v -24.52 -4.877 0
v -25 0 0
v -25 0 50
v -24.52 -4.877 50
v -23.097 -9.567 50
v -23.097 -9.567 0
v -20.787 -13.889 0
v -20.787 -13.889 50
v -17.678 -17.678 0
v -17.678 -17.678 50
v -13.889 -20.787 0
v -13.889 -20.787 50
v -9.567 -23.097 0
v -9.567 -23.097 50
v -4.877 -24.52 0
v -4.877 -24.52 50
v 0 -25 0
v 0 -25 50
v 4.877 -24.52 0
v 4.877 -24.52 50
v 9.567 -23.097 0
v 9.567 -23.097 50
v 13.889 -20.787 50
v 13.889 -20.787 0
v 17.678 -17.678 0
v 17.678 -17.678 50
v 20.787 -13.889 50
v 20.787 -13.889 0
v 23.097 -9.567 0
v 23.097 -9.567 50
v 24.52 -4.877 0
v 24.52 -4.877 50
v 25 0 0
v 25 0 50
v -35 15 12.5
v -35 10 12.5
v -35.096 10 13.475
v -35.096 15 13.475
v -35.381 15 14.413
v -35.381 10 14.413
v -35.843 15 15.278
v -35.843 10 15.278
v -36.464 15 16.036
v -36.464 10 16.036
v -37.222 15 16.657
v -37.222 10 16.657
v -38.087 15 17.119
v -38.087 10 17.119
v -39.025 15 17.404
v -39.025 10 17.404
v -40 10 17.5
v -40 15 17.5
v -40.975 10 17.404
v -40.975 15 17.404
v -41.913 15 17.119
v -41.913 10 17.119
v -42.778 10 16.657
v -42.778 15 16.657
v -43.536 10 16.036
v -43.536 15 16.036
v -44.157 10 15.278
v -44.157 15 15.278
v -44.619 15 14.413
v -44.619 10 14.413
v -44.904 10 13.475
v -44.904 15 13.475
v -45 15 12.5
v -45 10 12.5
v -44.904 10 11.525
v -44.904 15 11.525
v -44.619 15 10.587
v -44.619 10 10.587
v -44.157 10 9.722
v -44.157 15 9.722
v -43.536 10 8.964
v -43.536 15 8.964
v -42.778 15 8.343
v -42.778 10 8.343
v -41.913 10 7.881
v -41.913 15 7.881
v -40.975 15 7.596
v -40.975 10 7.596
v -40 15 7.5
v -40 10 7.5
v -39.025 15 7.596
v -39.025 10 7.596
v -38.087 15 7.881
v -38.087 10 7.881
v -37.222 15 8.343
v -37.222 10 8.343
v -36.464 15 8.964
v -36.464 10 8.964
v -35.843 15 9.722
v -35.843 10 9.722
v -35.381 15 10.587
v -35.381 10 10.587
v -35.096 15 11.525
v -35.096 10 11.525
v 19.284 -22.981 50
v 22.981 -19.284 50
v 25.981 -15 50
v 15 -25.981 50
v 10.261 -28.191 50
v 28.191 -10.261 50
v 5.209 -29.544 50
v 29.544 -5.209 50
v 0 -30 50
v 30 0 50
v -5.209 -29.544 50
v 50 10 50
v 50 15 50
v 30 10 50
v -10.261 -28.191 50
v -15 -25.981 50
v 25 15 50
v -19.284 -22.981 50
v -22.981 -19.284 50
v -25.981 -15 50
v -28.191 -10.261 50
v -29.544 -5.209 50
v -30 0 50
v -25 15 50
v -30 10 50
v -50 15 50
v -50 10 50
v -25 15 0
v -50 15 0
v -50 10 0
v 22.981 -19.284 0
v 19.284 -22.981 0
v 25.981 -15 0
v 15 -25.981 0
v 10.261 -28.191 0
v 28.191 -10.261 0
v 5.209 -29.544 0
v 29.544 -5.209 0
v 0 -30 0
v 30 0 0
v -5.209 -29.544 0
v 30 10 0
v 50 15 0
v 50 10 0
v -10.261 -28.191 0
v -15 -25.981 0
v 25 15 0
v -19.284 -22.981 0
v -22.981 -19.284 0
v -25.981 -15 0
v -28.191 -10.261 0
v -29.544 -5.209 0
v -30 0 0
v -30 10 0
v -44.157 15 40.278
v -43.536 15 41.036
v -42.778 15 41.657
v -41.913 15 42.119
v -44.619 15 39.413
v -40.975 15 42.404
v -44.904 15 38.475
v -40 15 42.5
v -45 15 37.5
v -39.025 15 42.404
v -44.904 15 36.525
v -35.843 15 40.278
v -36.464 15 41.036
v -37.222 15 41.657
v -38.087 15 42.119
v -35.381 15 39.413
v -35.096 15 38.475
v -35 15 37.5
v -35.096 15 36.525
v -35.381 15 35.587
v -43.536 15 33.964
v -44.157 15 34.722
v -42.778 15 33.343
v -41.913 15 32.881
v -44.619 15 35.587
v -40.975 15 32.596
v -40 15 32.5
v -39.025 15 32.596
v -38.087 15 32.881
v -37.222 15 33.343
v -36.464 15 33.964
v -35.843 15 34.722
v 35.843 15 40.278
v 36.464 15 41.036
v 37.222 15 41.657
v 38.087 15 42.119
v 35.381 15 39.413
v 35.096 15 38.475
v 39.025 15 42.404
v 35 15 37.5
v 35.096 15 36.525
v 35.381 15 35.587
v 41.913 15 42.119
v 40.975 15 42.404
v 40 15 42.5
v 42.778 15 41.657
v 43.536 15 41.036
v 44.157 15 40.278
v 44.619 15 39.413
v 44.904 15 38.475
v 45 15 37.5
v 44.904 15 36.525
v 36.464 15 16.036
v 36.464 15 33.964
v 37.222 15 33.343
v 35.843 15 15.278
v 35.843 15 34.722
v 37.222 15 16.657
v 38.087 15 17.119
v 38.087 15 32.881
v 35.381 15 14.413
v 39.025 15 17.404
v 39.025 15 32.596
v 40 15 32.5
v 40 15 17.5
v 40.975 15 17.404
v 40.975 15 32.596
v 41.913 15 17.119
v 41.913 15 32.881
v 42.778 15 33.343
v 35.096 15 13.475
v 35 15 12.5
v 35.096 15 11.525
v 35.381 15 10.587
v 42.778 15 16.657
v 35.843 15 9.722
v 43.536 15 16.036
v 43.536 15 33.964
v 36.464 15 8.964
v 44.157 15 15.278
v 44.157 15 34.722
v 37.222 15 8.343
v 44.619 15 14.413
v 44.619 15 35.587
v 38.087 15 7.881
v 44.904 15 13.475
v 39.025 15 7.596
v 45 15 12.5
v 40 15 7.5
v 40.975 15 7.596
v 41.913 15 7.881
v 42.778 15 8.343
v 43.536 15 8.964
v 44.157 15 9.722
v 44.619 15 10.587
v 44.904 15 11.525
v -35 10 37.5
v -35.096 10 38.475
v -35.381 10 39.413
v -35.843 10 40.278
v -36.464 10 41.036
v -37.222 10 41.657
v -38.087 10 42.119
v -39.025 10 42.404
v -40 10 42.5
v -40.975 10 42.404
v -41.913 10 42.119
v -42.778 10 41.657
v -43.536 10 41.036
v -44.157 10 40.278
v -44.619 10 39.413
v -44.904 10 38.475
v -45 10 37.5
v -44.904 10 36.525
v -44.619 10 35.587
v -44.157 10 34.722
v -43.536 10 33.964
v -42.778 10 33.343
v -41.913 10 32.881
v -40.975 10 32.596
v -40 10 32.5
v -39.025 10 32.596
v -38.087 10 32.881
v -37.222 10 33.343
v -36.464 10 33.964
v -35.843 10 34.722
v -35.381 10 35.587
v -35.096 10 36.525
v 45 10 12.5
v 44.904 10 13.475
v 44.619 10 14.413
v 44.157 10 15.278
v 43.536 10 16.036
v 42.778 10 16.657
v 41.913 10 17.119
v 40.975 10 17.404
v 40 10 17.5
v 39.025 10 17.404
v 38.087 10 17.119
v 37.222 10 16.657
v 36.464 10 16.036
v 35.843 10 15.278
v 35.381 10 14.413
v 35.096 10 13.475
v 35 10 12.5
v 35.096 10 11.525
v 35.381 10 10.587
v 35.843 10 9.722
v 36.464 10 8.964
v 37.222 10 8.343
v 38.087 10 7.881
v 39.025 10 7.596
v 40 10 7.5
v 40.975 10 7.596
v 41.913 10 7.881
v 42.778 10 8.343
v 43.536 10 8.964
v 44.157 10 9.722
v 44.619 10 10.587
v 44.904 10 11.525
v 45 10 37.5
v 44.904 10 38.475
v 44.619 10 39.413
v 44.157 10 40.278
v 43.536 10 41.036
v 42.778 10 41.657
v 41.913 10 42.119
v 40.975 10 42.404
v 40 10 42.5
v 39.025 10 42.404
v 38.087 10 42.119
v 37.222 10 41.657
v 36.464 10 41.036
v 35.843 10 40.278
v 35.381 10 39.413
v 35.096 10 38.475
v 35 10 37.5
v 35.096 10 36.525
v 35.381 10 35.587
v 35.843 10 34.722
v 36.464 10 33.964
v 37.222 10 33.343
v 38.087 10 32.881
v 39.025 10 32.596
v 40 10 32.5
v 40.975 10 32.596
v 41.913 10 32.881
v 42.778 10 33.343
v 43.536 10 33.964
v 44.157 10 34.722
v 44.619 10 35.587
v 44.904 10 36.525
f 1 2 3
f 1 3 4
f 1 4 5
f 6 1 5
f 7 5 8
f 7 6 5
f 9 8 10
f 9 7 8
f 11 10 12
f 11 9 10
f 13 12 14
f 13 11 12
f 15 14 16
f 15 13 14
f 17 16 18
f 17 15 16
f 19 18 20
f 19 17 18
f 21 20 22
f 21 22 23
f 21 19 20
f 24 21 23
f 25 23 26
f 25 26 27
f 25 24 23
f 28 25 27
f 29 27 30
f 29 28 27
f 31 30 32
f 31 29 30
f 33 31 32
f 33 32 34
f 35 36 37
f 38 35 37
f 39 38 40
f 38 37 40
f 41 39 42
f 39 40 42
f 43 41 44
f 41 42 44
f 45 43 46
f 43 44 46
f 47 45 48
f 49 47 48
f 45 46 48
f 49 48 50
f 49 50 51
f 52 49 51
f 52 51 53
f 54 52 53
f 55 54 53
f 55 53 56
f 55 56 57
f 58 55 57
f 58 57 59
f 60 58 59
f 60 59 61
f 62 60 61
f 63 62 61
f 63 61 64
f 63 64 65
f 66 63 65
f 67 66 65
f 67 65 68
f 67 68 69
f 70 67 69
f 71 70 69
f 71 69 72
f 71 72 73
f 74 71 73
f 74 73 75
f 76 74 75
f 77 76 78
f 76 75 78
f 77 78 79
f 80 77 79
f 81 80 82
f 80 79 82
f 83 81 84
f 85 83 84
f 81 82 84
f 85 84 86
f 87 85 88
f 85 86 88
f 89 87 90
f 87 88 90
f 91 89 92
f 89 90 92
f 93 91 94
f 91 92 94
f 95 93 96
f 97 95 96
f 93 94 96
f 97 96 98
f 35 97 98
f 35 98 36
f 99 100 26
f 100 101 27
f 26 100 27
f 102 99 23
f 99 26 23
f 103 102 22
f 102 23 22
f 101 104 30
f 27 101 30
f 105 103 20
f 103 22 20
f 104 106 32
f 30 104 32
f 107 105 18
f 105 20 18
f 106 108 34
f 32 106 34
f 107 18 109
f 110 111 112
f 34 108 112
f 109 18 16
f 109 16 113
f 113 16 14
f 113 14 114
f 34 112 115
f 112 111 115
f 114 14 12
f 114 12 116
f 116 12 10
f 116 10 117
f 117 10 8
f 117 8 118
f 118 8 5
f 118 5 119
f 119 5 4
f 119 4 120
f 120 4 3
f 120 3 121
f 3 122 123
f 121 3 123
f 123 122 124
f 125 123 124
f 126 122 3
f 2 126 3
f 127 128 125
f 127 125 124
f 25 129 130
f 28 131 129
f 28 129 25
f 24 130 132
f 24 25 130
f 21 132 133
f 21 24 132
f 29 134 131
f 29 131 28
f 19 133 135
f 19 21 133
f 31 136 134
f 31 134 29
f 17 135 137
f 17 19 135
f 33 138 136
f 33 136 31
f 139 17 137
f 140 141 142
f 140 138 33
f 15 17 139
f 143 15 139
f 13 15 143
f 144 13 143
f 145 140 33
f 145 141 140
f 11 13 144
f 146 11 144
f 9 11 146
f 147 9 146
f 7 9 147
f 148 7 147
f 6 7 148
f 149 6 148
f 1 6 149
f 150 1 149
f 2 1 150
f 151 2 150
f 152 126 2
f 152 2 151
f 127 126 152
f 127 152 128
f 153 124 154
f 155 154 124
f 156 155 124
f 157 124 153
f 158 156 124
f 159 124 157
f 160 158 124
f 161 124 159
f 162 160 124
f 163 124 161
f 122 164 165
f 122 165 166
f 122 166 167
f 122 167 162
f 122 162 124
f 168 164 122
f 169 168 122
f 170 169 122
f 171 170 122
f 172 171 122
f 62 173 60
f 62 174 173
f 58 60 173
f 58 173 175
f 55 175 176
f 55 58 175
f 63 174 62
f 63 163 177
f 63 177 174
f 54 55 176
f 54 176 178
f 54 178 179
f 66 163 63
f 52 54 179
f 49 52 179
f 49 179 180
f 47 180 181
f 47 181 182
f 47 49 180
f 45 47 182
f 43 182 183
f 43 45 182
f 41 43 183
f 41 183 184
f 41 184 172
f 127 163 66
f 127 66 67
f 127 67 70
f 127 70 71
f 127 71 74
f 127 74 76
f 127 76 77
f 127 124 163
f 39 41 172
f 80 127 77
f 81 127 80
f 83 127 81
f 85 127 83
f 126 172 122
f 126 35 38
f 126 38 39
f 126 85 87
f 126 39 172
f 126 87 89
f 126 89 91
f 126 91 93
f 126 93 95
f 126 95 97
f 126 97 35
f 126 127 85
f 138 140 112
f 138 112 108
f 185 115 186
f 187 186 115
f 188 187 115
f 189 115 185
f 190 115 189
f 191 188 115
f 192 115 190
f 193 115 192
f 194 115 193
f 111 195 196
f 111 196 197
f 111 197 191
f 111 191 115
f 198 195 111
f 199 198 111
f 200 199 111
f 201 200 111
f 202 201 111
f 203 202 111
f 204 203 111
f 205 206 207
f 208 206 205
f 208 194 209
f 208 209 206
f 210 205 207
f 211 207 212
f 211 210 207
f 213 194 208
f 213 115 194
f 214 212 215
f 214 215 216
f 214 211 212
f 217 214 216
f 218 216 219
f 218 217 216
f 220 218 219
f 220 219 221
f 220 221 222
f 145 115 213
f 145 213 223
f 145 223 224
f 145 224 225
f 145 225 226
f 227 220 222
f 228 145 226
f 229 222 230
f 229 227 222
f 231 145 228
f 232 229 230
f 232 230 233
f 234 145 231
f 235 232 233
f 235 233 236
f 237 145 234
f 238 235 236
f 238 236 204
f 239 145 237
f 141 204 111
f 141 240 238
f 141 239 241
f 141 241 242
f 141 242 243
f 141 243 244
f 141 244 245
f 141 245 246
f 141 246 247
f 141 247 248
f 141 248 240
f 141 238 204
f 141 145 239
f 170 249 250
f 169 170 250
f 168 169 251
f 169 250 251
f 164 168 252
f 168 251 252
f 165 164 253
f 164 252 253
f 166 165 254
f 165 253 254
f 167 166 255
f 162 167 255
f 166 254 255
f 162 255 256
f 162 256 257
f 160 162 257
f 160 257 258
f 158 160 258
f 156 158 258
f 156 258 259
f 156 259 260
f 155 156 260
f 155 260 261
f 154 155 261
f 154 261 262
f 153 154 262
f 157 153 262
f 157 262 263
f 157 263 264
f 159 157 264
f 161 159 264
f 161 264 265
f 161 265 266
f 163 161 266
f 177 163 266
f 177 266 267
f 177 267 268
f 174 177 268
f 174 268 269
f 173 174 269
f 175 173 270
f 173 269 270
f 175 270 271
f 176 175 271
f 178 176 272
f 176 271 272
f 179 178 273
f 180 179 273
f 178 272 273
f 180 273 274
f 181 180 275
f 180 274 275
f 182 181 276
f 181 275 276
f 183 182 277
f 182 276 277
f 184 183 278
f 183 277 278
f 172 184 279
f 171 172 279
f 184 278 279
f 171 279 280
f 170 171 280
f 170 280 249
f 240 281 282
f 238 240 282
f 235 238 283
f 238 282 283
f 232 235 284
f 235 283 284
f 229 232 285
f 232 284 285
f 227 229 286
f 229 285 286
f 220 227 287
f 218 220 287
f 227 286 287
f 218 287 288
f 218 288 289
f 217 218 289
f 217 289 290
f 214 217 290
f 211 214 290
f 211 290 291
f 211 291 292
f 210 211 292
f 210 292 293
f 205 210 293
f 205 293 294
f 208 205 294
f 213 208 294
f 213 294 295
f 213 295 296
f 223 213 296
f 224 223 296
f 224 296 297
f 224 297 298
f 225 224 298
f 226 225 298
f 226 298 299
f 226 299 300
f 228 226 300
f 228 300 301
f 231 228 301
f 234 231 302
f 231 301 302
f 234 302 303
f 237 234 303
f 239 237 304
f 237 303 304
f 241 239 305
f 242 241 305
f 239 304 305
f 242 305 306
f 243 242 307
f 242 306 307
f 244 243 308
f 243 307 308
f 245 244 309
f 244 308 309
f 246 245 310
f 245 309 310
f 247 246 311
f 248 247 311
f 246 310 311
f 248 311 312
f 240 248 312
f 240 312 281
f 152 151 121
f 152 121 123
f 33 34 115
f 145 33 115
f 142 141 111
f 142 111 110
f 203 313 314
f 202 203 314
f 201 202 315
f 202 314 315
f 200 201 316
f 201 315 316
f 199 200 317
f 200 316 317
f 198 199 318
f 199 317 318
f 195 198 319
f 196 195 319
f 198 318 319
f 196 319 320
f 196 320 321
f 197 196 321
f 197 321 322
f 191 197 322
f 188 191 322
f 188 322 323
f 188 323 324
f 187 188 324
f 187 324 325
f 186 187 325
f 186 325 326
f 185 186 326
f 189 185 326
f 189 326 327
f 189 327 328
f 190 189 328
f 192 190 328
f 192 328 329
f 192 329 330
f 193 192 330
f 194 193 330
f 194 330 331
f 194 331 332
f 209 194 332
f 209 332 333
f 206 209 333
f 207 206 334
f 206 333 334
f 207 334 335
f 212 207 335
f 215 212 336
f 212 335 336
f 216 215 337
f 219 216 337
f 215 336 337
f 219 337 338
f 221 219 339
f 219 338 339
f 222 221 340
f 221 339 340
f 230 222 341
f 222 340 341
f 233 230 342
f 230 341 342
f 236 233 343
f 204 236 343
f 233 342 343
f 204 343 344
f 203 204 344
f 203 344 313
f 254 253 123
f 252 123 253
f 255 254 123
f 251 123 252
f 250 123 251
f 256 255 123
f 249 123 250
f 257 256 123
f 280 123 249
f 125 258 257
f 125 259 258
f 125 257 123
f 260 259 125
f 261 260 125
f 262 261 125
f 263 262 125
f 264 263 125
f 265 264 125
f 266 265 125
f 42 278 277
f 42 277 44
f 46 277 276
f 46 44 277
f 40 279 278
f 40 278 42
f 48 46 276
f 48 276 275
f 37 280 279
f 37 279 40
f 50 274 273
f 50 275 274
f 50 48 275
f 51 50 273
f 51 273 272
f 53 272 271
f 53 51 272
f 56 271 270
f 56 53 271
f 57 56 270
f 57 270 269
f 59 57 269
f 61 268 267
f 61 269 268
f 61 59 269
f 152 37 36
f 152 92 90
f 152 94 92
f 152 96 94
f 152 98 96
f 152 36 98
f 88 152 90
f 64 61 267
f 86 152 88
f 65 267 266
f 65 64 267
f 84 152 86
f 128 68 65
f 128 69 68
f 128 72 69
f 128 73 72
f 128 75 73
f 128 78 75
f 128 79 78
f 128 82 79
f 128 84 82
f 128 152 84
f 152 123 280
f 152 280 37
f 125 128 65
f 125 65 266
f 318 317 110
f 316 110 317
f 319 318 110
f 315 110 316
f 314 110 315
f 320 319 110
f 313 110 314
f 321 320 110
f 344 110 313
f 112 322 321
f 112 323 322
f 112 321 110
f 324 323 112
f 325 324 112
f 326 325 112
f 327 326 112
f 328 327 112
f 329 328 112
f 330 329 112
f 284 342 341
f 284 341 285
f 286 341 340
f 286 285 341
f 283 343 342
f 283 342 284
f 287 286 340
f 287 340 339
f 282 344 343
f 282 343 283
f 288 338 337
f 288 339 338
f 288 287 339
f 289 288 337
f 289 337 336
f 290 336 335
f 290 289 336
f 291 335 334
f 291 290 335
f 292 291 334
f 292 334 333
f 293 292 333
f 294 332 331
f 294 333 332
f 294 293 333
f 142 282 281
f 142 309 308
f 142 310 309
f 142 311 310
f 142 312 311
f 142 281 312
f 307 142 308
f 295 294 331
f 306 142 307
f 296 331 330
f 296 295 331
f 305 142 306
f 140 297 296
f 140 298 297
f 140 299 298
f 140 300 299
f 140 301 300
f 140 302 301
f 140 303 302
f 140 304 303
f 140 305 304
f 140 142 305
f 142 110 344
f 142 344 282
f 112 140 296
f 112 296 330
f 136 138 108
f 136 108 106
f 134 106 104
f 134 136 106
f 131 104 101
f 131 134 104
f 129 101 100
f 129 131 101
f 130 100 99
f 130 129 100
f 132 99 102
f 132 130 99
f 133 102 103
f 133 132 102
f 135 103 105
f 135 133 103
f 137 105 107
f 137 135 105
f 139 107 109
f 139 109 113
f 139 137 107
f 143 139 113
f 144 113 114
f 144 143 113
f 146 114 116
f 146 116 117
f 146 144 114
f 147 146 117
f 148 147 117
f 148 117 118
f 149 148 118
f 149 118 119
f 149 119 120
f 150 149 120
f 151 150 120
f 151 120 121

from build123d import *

# Parameters (mm, degrees)
BOSS_EXTRUDE1_DEPTH = 50
SKETCH2_R           = 5
CUT_EXTRUDE1_DEPTH  = 6


with BuildPart() as part:
    # Sketch1 → Boss-Extrude1 (new body)
    with BuildSketch(Plane.XY):
        with BuildLine():
            Line((-50, 15), (-25, 15))
            Line((-25, 15), (-25, 0))
            ThreePointArc((-25, 0), (0, -25), (25, 0))
            Line((25, 0), (25, 15))
            Line((25, 15), (50, 15))
            Line((50, 15), (50, 10))
            Line((50, 10), (30, 10))
            Line((30, 10), (30, 0))
            ThreePointArc((30, 0), (0, -30), (-30, 0))
            Line((-30, 0), (-30, 10))
            Line((-30, 10), (-50, 10))
            Line((-50, 10), (-50, 15))
        make_face()
    extrude(amount=BOSS_EXTRUDE1_DEPTH)

    # Sketch2 → Cut-Extrude1 (cut, through all)
    with BuildSketch(Plane.XZ.offset(-10)):
        with Locations((40, 37.5)):
            Circle(SKETCH2_R)
        with Locations((40, 12.5)):
            Circle(SKETCH2_R)
        with Locations((-40, 12.5)):
            Circle(SKETCH2_R)
        with Locations((-40, 37.5)):
            Circle(SKETCH2_R)
    extrude(amount=-CUT_EXTRUDE1_DEPTH, mode=Mode.SUBTRACT)


solid = part.part
